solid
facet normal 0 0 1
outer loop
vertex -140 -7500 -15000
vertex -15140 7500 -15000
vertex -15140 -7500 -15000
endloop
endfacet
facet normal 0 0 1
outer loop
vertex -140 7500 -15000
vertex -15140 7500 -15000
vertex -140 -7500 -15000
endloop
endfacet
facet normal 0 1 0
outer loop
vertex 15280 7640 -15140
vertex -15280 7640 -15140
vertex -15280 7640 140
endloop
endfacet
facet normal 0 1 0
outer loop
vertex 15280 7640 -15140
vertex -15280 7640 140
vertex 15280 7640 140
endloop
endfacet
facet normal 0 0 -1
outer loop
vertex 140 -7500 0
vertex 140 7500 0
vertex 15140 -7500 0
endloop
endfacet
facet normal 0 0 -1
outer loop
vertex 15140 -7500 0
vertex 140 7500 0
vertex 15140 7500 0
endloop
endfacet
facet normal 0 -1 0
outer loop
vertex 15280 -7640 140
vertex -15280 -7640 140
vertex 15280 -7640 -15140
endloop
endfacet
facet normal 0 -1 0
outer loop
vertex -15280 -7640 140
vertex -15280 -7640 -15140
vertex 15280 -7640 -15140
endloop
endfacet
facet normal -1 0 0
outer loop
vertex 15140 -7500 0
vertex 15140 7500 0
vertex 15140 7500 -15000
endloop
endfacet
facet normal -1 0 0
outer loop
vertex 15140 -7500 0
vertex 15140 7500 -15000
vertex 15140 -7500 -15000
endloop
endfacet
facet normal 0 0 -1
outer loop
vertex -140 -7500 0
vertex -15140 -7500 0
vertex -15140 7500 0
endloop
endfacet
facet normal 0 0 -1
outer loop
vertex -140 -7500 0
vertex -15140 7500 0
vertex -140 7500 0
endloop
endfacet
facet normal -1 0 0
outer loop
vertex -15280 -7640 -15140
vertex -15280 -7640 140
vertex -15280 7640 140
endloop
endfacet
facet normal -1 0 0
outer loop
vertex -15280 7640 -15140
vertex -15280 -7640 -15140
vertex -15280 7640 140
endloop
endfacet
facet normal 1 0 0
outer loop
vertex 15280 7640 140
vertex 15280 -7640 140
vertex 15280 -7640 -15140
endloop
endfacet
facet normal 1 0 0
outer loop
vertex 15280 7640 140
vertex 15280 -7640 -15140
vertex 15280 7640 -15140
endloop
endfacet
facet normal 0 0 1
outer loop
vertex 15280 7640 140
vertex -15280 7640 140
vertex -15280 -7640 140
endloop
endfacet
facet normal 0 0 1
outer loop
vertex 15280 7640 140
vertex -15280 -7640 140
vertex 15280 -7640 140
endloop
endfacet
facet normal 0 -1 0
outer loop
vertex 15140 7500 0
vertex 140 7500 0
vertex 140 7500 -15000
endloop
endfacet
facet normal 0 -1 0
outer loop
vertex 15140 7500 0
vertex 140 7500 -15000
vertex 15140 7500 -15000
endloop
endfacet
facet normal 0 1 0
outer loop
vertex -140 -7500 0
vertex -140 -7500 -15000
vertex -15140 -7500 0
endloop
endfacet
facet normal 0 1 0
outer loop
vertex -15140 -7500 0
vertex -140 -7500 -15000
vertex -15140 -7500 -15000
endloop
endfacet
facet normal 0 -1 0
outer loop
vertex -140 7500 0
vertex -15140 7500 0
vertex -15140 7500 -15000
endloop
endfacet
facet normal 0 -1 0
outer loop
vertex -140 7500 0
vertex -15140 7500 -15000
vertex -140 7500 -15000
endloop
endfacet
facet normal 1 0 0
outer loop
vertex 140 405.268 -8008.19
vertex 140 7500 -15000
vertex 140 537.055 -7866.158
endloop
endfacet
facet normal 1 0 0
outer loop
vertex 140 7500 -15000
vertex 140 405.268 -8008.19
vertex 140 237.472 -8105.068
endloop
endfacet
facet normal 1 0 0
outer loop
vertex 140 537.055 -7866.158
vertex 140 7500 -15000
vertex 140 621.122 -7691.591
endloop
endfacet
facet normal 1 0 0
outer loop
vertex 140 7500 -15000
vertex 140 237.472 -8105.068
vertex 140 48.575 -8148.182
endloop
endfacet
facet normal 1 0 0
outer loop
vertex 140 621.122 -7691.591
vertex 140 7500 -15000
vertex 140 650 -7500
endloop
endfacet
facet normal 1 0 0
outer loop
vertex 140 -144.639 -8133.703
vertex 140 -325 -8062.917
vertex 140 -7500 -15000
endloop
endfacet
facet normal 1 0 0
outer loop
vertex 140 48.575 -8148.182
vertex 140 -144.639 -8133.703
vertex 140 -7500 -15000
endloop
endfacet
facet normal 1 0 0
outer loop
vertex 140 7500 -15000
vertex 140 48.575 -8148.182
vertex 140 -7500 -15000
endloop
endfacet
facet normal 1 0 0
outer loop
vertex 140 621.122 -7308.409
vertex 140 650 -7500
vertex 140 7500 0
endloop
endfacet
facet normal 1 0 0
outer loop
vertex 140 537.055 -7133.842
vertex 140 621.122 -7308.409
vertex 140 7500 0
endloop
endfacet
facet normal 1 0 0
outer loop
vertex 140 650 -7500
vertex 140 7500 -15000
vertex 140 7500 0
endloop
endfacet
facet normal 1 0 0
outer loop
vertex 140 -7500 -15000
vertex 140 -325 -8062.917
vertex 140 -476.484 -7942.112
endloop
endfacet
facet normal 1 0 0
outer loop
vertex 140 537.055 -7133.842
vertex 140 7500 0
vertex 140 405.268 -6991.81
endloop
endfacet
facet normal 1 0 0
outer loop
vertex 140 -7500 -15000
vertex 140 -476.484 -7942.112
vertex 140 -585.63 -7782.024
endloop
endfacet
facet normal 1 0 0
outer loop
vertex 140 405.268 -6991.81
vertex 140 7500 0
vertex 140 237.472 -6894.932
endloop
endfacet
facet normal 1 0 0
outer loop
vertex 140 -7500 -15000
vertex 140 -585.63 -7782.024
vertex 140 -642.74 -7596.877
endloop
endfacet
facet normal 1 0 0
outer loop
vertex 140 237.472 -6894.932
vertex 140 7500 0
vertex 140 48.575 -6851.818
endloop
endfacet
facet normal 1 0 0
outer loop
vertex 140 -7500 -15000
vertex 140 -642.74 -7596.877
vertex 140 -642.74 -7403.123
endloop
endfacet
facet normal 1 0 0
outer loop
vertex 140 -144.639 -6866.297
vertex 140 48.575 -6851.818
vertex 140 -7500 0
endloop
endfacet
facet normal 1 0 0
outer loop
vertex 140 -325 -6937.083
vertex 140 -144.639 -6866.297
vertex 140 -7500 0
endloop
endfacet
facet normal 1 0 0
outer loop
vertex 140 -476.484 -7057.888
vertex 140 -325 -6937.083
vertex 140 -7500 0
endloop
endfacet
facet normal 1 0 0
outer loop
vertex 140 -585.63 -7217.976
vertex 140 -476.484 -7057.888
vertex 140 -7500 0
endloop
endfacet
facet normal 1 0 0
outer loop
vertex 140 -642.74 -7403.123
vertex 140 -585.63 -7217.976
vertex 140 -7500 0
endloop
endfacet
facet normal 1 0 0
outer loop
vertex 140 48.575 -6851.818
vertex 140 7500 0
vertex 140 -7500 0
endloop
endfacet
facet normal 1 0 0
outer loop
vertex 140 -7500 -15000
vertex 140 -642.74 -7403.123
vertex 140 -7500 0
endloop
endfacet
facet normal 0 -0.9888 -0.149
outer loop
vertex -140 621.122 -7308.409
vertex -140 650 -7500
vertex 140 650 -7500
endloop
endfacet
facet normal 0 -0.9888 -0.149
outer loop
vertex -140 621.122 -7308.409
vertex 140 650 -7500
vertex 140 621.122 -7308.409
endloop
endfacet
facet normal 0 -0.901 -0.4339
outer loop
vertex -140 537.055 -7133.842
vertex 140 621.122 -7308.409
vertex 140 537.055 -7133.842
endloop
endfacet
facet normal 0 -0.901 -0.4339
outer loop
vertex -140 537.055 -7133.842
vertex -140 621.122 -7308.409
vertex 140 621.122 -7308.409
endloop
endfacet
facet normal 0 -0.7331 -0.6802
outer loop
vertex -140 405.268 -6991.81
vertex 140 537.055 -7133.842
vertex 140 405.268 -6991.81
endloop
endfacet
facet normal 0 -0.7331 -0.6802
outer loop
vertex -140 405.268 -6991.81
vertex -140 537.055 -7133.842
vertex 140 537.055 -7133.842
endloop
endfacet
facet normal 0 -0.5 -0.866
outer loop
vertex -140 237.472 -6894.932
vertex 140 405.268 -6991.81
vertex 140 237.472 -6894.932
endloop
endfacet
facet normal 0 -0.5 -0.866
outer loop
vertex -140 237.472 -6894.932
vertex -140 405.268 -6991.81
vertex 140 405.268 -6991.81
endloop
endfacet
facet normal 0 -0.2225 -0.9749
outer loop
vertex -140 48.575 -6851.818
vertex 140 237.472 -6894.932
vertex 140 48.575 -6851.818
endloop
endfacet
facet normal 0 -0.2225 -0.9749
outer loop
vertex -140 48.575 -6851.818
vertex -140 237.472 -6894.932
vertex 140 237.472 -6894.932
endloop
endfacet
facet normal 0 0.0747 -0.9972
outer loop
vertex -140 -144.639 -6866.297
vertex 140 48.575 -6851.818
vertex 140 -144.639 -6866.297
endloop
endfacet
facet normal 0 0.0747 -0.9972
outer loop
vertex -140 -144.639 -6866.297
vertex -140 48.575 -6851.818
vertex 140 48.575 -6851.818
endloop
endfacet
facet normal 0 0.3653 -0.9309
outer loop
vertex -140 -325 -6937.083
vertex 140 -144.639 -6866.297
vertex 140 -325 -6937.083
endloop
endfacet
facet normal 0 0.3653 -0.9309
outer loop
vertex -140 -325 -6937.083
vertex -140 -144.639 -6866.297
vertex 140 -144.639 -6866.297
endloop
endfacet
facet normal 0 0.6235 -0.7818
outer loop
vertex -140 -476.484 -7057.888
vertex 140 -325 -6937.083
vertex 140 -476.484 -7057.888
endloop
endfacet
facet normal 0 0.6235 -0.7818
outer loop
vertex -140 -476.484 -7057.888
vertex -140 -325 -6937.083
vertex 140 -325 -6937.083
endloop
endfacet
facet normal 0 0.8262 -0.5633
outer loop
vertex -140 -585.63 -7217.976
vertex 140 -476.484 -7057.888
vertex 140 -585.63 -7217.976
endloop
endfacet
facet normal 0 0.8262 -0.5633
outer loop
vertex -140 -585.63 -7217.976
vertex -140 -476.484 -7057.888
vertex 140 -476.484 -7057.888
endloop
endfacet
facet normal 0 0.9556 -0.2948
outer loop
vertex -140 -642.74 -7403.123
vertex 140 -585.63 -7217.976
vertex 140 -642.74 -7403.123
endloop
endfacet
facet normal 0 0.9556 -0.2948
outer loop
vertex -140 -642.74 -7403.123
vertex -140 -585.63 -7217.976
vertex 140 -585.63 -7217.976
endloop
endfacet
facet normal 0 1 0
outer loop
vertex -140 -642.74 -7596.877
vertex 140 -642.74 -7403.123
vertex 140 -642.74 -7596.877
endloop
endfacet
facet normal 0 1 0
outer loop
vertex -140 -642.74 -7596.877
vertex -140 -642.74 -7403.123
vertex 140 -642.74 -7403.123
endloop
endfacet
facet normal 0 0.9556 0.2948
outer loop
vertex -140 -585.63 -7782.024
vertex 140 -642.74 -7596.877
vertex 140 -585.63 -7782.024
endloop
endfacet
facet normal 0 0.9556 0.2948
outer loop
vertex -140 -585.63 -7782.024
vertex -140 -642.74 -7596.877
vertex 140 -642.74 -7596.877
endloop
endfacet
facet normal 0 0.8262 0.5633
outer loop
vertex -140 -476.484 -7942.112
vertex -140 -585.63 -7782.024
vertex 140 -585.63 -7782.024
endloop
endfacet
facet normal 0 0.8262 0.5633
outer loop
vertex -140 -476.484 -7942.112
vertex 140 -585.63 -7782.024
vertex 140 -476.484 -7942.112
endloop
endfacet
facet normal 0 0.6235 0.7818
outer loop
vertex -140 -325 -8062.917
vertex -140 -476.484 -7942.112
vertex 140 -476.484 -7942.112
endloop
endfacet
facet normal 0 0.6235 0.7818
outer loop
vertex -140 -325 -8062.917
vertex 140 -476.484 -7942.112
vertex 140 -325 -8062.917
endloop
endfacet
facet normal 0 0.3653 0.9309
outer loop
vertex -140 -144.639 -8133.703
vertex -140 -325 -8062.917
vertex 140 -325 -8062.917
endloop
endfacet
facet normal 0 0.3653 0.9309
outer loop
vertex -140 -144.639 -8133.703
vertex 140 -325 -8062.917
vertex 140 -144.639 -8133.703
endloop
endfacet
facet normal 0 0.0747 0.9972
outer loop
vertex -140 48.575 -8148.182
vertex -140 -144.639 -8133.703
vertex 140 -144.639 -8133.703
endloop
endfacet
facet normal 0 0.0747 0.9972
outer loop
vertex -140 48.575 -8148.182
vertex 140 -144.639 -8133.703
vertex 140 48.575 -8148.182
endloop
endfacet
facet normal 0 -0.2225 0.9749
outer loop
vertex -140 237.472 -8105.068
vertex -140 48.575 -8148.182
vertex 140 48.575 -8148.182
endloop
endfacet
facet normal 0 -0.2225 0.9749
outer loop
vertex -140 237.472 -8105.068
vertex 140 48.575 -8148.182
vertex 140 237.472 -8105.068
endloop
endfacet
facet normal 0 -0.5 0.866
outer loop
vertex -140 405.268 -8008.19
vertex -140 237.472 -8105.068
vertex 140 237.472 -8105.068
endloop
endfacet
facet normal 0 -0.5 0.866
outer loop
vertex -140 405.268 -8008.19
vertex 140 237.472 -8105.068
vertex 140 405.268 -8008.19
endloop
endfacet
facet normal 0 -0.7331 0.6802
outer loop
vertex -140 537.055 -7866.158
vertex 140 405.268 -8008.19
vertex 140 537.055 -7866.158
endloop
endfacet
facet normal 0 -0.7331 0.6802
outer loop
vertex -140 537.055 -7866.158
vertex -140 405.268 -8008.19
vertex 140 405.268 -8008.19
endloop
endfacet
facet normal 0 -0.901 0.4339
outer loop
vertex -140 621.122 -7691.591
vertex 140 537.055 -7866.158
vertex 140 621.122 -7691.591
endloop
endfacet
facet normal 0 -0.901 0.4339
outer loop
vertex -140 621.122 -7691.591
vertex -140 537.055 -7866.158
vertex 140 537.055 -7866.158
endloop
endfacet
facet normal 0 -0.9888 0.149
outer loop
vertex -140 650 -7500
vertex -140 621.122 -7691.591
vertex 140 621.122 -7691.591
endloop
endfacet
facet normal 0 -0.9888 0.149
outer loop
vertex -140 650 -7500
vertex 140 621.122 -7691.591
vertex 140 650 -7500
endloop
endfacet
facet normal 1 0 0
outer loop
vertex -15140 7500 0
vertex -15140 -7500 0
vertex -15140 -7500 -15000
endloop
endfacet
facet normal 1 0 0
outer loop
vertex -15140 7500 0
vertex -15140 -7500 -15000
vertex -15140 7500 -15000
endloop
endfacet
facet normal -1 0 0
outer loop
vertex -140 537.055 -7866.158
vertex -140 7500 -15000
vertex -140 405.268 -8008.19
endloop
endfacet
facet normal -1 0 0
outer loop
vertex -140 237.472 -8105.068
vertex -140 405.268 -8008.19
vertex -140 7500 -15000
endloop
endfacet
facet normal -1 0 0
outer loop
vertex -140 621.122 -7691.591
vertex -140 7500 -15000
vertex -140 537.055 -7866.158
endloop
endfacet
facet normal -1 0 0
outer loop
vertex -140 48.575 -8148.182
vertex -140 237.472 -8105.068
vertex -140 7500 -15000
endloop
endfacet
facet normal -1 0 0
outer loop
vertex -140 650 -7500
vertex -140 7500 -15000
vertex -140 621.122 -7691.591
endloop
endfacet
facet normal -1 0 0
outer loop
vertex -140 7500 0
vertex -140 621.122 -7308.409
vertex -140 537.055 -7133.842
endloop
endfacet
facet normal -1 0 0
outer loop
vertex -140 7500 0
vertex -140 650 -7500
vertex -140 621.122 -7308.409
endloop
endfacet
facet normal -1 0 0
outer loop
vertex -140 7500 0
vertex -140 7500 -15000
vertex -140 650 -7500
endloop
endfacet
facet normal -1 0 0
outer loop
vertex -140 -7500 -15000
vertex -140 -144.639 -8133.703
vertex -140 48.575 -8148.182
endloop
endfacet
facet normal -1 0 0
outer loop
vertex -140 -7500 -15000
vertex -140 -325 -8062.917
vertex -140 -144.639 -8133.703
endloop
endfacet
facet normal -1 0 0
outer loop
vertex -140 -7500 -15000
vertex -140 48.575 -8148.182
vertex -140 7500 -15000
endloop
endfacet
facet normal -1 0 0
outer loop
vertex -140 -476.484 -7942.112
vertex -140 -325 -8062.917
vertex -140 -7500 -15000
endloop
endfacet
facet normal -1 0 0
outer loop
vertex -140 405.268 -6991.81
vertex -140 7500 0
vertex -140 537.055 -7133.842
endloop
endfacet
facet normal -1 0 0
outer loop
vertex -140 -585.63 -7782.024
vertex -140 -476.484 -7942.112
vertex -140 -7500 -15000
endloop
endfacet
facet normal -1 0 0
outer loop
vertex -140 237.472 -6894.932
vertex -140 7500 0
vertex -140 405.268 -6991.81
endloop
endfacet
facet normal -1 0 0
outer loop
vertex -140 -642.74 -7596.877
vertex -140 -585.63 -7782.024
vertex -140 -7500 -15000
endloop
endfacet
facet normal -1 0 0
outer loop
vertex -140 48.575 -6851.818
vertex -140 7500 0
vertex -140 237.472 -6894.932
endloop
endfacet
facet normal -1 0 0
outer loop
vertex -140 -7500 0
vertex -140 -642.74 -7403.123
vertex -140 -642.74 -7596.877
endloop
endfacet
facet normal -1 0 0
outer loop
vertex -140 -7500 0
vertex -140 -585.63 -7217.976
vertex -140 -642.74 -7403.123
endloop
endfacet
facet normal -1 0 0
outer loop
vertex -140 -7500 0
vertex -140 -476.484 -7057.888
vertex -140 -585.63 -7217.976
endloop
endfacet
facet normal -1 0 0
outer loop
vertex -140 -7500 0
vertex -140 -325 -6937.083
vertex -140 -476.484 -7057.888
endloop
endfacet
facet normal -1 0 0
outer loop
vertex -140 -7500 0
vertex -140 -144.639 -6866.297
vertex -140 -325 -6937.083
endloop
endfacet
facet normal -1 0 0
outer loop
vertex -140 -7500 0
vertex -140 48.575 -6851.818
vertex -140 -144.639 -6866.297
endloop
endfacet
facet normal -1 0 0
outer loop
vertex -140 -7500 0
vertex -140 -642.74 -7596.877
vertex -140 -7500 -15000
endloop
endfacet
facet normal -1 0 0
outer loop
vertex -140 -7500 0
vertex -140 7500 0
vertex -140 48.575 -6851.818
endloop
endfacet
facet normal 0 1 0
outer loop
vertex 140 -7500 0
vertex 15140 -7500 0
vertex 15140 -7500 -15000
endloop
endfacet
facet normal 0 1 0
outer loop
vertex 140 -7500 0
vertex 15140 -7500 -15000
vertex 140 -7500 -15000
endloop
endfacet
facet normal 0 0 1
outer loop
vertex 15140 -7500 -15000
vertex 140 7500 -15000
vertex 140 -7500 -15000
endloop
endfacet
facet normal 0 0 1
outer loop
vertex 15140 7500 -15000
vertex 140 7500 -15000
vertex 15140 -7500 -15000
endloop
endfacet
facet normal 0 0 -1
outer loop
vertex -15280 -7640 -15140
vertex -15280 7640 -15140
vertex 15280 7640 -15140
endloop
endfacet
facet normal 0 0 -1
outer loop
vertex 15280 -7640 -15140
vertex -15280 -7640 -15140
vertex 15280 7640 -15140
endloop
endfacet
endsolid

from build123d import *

# Parameters (mm, degrees)
F1_W      = 30560
F1_H      = 15280
F2_DEPTH  = 140
F3_W      = 30560
F3_H      = 15280
F3_W_2    = 15000
F3_H_2    = 15000
F4_DEPTH  = 6850
F5_W      = 30560
F5_H      = 15280
F6_DEPTH  = 1300
F10_W     = 30560
F10_H     = 15280
F10_W_2   = 280
F10_H_2   = 1300
F11_DEPTH = 6850
F12_DEPTH = 280
F13_W     = 30560
F13_H     = 15280
F13_W_2   = 15000
F13_H_2   = 15000
F14_DEPTH = 140


with BuildPart() as f2:
    # F1 (on offset) → F2 (new body)
    with BuildSketch(Plane.XY.offset(-15140)):
        Rectangle(F1_W, F1_H)
    extrude(amount=F2_DEPTH)

    # F3 (on face) → F4 (join)
    with BuildSketch(Plane.XY.offset(-15000)):
        Rectangle(F3_W, F3_H)
        with Locations((-7640, 0)):
            Rectangle(F3_W_2, F3_H_2, mode=Mode.SUBTRACT)
        with Locations((7640, 0)):
            Rectangle(F3_W_2, F3_H_2, mode=Mode.SUBTRACT)
    extrude(amount=F4_DEPTH)

    # F5 (on face) → F6 (join)
    with BuildSketch(Plane.XY.offset(-8150)):
        Rectangle(F5_W, F5_H)
        Polygon((-15140, -7500), (-15140, 7500), (-140, 7500), (-140, 650), (140, 650), (140, 7500), (15140, 7500), (15140, -7500), (140, -7500), (140, -650), (-140, -650), (-140, -7500), align=None, mode=Mode.SUBTRACT)
    extrude(amount=F6_DEPTH)

    # F10 (on face) → F11 (join)
    with BuildSketch(Plane.XY.offset(-6850)):
        Rectangle(F10_W, F10_H)
        Polygon((-15140, -7500), (-15140, 7500), (-140, 7500), (-140, 650), (140, 650), (140, 7500), (15140, 7500), (15140, -7500), (140, -7500), (140, -650), (-140, -650), (-140, -7500), align=None, mode=Mode.SUBTRACT)
        Rectangle(F10_W_2, F10_H_2)
    extrude(amount=F11_DEPTH)

    # F9 (on face) → F12 (join)
    with BuildSketch(Plane(origin=(-140, 0, 0), x_dir=(0, -1, 0), z_dir=(-1, 0, 0))):
        with BuildLine():
            Line((650, -7500), (650, -6850))
            Line((650, -6850), (6.2463e-06, -6850))
            ThreePointArc((6.2463e-06, -6850), (459.6194099796, -7040.3805944371), (650, -7500))
        make_face()
        with BuildLine():
            ThreePointArc((-650, -7500), (-459.6194055629, -7040.3805900204), (6.2463e-06, -6850))
            Line((6.2463e-06, -6850), (-650, -6850))
            Line((-650, -6850), (-650, -7500))
        make_face()
        with BuildLine():
            Line((650, -8150), (650, -7500))
            ThreePointArc((650, -7500), (459.6194077131, -7959.6194078294), (-1.644e-07, -8150))
            Line((-1.644e-07, -8150), (650, -8150))
        make_face()
        with BuildLine():
            ThreePointArc((-1.644e-07, -8150), (-459.6194078294, -7959.6194077131), (-650, -7500))
            Line((-650, -7500), (-650, -8150))
            Line((-650, -8150), (-1.644e-07, -8150))
        make_face()
    extrude(amount=-F12_DEPTH)

    # F13 (on face) → F14 (join)
    with BuildSketch(Plane.XY):
        Rectangle(F13_W, F13_H)
        with Locations((-7640, 0)):
            Rectangle(F13_W_2, F13_H_2, mode=Mode.SUBTRACT)
        with Locations((7640, 0)):
            Rectangle(F13_W_2, F13_H_2, mode=Mode.SUBTRACT)
        with Locations((-7640, 0)):
            Rectangle(F13_W_2, F13_H_2)
        with Locations((7640, 0)):
            Rectangle(F13_W_2, F13_H_2)
    extrude(amount=F14_DEPTH)


solid = f2.part
